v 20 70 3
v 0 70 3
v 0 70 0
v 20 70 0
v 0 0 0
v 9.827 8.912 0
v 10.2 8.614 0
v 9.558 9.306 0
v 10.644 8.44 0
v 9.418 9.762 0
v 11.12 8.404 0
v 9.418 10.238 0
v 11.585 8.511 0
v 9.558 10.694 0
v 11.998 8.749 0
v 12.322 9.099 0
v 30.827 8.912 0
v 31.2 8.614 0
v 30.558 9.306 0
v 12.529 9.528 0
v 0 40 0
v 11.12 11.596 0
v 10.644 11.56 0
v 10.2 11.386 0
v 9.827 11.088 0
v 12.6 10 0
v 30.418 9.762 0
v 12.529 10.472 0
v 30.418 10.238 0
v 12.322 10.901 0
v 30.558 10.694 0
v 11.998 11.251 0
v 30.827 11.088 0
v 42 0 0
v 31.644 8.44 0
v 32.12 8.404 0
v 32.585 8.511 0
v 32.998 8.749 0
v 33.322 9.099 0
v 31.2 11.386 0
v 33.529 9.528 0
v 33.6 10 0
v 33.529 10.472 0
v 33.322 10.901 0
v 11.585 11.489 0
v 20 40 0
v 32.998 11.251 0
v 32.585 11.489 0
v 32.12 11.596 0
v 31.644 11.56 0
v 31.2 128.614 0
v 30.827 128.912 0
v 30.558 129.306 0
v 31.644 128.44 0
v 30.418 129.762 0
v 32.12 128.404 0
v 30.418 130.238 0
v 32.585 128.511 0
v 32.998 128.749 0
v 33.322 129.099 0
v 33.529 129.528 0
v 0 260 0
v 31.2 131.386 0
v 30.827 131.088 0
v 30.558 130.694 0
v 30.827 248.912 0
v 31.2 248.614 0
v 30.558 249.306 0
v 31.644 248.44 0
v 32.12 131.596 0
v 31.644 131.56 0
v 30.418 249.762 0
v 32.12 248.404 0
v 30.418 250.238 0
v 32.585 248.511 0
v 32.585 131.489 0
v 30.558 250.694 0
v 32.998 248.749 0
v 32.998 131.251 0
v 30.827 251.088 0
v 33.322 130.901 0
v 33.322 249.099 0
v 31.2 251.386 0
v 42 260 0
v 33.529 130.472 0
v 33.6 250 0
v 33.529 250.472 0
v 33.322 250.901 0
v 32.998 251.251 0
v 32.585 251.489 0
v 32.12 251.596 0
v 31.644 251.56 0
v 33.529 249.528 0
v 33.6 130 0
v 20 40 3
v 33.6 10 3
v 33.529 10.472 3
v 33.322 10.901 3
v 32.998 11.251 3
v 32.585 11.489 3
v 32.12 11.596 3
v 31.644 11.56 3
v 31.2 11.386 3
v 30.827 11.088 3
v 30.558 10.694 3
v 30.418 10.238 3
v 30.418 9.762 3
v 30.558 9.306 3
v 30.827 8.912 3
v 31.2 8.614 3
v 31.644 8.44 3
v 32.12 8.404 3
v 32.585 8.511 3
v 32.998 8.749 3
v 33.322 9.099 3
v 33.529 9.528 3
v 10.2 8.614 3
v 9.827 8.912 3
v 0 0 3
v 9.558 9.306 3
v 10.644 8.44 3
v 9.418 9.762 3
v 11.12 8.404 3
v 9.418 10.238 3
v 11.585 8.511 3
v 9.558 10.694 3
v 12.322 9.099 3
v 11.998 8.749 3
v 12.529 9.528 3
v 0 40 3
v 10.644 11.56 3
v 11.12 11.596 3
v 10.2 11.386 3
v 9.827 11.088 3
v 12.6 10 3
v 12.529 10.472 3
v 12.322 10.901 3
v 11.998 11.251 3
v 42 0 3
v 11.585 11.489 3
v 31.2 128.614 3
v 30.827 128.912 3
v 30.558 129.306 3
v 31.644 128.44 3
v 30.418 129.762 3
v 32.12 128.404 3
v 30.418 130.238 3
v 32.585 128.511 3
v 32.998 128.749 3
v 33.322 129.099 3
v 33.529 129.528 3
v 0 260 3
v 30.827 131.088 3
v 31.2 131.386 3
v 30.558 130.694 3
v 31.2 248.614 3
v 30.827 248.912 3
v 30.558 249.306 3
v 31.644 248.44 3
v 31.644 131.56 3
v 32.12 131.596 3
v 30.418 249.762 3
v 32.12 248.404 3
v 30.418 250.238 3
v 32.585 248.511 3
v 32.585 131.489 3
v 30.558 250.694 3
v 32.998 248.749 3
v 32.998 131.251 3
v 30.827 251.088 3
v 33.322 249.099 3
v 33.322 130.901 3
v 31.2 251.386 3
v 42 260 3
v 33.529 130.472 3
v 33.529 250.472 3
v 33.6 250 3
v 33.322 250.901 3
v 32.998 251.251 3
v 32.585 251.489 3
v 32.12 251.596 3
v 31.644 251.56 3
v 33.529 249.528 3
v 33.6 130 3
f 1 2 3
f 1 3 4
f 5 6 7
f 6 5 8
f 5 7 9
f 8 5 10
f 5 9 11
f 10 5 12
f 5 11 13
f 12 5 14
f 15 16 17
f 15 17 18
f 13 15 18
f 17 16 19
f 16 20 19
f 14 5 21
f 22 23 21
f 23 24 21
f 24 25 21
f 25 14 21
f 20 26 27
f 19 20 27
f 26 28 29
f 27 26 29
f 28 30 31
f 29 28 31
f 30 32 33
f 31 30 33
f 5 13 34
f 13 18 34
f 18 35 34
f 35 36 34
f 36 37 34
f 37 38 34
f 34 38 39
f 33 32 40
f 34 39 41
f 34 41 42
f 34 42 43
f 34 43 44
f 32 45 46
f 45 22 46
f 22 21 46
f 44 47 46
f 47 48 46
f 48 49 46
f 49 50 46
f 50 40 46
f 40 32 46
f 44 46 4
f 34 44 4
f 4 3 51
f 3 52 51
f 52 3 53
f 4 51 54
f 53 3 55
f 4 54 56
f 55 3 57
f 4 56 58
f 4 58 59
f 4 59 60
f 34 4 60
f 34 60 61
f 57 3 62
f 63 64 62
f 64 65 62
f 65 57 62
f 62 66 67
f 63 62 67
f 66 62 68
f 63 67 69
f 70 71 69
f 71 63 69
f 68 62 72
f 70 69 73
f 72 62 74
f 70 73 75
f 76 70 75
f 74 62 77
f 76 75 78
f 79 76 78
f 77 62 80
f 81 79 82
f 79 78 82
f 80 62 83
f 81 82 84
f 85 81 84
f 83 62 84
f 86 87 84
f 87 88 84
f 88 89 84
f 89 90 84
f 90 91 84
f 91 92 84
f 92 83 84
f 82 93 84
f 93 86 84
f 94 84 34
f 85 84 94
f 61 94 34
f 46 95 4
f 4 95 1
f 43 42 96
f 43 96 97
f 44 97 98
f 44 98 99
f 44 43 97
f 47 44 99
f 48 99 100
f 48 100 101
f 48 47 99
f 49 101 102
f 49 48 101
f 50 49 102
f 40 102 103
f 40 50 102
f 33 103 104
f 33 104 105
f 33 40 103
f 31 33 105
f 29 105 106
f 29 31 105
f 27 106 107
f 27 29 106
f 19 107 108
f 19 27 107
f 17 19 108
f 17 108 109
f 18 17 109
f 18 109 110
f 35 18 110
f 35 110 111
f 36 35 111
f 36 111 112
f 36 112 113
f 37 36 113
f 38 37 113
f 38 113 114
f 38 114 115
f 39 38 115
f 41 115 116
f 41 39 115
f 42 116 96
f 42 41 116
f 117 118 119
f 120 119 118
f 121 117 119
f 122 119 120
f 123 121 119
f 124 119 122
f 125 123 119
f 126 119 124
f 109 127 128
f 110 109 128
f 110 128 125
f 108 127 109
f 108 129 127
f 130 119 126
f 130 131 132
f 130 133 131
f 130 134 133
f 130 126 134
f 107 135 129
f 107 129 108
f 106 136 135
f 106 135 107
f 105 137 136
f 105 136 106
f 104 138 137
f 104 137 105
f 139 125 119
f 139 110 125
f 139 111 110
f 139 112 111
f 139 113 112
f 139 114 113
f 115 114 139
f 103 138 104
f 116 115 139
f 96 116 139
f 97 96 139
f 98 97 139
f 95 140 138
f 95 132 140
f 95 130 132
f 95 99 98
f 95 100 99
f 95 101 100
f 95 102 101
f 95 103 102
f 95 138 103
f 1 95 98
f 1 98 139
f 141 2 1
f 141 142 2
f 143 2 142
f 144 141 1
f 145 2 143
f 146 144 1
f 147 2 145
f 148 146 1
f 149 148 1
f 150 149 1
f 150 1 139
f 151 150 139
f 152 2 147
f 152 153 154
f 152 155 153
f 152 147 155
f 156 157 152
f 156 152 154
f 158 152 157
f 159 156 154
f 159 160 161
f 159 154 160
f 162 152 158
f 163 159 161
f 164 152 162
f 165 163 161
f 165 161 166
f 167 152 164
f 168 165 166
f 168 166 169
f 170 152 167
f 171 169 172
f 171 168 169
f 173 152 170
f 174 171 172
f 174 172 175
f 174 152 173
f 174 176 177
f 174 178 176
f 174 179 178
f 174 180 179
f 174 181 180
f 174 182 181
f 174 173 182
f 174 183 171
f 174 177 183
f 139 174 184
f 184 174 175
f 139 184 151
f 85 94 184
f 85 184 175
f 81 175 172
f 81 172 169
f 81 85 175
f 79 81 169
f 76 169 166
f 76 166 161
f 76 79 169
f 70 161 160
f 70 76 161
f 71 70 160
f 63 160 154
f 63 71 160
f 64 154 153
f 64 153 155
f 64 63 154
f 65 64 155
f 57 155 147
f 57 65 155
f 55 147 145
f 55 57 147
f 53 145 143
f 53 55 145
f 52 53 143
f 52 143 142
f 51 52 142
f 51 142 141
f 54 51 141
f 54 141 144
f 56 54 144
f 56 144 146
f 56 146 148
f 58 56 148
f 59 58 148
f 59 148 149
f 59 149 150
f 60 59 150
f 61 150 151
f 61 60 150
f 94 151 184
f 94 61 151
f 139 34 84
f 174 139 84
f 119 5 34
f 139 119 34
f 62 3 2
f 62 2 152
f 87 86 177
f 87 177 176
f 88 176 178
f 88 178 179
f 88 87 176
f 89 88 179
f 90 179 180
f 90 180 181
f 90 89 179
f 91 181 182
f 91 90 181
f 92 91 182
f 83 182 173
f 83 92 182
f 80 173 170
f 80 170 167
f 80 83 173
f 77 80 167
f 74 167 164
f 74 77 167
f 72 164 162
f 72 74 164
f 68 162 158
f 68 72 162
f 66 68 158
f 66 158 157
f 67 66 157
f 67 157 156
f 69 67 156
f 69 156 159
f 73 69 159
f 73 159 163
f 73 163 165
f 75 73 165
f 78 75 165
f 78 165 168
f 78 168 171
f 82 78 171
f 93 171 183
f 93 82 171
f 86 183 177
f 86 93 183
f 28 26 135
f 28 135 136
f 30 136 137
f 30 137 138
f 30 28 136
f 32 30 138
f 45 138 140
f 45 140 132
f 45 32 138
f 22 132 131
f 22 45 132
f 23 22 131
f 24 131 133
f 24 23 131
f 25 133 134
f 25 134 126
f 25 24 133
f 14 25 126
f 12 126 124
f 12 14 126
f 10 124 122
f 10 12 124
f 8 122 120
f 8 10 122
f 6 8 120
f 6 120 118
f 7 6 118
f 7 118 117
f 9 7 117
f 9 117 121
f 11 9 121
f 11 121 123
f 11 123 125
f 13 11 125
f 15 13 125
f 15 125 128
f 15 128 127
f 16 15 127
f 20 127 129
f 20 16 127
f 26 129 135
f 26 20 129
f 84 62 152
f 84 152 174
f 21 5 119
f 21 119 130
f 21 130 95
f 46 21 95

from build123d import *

# Parameters (mm, degrees)
SKETCH1_W                    = 42
SKETCH1_H                    = 260
BOSS_EXTRUDE1_DEPTH          = 3
M3_CLEARANCE_HOLE1_OUTLINE_R = 1.6
M3_CLEARANCE_HOLE1_DEPTH     = 3
SKETCH4_W                    = 20
SKETCH4_H                    = 30
CUT_EXTRUDE1_DEPTH           = 10


# Read off the part's stored shape, not the designer's step: M3 Clearance Hole1
with BuildPart() as part:
    # Sketch1 → Boss-Extrude1 (new body)
    with BuildSketch(Plane.XY):
        with Locations((21, 130)):
            Rectangle(SKETCH1_W, SKETCH1_H)
    extrude(amount=BOSS_EXTRUDE1_DEPTH)

    # M3 Clearance Hole1 outline → M3 Clearance Hole1 (cut)
    with BuildSketch(Plane.XY):
        with Locations((32, 130)):
            Circle(M3_CLEARANCE_HOLE1_OUTLINE_R)
        with Locations((32, 10)):
            Circle(M3_CLEARANCE_HOLE1_OUTLINE_R)
        with Locations((32, 250)):
            Circle(M3_CLEARANCE_HOLE1_OUTLINE_R)
        with Locations((11, 10)):
            Circle(M3_CLEARANCE_HOLE1_OUTLINE_R)
    extrude(amount=M3_CLEARANCE_HOLE1_DEPTH, mode=Mode.SUBTRACT)

    # Sketch4 → Cut-Extrude1 (cut)
    with BuildSketch(Plane.XY.offset(3)):
        with Locations((10, 55)):
            Rectangle(SKETCH4_W, SKETCH4_H)
    extrude(amount=-CUT_EXTRUDE1_DEPTH, mode=Mode.SUBTRACT)


solid = part.part
